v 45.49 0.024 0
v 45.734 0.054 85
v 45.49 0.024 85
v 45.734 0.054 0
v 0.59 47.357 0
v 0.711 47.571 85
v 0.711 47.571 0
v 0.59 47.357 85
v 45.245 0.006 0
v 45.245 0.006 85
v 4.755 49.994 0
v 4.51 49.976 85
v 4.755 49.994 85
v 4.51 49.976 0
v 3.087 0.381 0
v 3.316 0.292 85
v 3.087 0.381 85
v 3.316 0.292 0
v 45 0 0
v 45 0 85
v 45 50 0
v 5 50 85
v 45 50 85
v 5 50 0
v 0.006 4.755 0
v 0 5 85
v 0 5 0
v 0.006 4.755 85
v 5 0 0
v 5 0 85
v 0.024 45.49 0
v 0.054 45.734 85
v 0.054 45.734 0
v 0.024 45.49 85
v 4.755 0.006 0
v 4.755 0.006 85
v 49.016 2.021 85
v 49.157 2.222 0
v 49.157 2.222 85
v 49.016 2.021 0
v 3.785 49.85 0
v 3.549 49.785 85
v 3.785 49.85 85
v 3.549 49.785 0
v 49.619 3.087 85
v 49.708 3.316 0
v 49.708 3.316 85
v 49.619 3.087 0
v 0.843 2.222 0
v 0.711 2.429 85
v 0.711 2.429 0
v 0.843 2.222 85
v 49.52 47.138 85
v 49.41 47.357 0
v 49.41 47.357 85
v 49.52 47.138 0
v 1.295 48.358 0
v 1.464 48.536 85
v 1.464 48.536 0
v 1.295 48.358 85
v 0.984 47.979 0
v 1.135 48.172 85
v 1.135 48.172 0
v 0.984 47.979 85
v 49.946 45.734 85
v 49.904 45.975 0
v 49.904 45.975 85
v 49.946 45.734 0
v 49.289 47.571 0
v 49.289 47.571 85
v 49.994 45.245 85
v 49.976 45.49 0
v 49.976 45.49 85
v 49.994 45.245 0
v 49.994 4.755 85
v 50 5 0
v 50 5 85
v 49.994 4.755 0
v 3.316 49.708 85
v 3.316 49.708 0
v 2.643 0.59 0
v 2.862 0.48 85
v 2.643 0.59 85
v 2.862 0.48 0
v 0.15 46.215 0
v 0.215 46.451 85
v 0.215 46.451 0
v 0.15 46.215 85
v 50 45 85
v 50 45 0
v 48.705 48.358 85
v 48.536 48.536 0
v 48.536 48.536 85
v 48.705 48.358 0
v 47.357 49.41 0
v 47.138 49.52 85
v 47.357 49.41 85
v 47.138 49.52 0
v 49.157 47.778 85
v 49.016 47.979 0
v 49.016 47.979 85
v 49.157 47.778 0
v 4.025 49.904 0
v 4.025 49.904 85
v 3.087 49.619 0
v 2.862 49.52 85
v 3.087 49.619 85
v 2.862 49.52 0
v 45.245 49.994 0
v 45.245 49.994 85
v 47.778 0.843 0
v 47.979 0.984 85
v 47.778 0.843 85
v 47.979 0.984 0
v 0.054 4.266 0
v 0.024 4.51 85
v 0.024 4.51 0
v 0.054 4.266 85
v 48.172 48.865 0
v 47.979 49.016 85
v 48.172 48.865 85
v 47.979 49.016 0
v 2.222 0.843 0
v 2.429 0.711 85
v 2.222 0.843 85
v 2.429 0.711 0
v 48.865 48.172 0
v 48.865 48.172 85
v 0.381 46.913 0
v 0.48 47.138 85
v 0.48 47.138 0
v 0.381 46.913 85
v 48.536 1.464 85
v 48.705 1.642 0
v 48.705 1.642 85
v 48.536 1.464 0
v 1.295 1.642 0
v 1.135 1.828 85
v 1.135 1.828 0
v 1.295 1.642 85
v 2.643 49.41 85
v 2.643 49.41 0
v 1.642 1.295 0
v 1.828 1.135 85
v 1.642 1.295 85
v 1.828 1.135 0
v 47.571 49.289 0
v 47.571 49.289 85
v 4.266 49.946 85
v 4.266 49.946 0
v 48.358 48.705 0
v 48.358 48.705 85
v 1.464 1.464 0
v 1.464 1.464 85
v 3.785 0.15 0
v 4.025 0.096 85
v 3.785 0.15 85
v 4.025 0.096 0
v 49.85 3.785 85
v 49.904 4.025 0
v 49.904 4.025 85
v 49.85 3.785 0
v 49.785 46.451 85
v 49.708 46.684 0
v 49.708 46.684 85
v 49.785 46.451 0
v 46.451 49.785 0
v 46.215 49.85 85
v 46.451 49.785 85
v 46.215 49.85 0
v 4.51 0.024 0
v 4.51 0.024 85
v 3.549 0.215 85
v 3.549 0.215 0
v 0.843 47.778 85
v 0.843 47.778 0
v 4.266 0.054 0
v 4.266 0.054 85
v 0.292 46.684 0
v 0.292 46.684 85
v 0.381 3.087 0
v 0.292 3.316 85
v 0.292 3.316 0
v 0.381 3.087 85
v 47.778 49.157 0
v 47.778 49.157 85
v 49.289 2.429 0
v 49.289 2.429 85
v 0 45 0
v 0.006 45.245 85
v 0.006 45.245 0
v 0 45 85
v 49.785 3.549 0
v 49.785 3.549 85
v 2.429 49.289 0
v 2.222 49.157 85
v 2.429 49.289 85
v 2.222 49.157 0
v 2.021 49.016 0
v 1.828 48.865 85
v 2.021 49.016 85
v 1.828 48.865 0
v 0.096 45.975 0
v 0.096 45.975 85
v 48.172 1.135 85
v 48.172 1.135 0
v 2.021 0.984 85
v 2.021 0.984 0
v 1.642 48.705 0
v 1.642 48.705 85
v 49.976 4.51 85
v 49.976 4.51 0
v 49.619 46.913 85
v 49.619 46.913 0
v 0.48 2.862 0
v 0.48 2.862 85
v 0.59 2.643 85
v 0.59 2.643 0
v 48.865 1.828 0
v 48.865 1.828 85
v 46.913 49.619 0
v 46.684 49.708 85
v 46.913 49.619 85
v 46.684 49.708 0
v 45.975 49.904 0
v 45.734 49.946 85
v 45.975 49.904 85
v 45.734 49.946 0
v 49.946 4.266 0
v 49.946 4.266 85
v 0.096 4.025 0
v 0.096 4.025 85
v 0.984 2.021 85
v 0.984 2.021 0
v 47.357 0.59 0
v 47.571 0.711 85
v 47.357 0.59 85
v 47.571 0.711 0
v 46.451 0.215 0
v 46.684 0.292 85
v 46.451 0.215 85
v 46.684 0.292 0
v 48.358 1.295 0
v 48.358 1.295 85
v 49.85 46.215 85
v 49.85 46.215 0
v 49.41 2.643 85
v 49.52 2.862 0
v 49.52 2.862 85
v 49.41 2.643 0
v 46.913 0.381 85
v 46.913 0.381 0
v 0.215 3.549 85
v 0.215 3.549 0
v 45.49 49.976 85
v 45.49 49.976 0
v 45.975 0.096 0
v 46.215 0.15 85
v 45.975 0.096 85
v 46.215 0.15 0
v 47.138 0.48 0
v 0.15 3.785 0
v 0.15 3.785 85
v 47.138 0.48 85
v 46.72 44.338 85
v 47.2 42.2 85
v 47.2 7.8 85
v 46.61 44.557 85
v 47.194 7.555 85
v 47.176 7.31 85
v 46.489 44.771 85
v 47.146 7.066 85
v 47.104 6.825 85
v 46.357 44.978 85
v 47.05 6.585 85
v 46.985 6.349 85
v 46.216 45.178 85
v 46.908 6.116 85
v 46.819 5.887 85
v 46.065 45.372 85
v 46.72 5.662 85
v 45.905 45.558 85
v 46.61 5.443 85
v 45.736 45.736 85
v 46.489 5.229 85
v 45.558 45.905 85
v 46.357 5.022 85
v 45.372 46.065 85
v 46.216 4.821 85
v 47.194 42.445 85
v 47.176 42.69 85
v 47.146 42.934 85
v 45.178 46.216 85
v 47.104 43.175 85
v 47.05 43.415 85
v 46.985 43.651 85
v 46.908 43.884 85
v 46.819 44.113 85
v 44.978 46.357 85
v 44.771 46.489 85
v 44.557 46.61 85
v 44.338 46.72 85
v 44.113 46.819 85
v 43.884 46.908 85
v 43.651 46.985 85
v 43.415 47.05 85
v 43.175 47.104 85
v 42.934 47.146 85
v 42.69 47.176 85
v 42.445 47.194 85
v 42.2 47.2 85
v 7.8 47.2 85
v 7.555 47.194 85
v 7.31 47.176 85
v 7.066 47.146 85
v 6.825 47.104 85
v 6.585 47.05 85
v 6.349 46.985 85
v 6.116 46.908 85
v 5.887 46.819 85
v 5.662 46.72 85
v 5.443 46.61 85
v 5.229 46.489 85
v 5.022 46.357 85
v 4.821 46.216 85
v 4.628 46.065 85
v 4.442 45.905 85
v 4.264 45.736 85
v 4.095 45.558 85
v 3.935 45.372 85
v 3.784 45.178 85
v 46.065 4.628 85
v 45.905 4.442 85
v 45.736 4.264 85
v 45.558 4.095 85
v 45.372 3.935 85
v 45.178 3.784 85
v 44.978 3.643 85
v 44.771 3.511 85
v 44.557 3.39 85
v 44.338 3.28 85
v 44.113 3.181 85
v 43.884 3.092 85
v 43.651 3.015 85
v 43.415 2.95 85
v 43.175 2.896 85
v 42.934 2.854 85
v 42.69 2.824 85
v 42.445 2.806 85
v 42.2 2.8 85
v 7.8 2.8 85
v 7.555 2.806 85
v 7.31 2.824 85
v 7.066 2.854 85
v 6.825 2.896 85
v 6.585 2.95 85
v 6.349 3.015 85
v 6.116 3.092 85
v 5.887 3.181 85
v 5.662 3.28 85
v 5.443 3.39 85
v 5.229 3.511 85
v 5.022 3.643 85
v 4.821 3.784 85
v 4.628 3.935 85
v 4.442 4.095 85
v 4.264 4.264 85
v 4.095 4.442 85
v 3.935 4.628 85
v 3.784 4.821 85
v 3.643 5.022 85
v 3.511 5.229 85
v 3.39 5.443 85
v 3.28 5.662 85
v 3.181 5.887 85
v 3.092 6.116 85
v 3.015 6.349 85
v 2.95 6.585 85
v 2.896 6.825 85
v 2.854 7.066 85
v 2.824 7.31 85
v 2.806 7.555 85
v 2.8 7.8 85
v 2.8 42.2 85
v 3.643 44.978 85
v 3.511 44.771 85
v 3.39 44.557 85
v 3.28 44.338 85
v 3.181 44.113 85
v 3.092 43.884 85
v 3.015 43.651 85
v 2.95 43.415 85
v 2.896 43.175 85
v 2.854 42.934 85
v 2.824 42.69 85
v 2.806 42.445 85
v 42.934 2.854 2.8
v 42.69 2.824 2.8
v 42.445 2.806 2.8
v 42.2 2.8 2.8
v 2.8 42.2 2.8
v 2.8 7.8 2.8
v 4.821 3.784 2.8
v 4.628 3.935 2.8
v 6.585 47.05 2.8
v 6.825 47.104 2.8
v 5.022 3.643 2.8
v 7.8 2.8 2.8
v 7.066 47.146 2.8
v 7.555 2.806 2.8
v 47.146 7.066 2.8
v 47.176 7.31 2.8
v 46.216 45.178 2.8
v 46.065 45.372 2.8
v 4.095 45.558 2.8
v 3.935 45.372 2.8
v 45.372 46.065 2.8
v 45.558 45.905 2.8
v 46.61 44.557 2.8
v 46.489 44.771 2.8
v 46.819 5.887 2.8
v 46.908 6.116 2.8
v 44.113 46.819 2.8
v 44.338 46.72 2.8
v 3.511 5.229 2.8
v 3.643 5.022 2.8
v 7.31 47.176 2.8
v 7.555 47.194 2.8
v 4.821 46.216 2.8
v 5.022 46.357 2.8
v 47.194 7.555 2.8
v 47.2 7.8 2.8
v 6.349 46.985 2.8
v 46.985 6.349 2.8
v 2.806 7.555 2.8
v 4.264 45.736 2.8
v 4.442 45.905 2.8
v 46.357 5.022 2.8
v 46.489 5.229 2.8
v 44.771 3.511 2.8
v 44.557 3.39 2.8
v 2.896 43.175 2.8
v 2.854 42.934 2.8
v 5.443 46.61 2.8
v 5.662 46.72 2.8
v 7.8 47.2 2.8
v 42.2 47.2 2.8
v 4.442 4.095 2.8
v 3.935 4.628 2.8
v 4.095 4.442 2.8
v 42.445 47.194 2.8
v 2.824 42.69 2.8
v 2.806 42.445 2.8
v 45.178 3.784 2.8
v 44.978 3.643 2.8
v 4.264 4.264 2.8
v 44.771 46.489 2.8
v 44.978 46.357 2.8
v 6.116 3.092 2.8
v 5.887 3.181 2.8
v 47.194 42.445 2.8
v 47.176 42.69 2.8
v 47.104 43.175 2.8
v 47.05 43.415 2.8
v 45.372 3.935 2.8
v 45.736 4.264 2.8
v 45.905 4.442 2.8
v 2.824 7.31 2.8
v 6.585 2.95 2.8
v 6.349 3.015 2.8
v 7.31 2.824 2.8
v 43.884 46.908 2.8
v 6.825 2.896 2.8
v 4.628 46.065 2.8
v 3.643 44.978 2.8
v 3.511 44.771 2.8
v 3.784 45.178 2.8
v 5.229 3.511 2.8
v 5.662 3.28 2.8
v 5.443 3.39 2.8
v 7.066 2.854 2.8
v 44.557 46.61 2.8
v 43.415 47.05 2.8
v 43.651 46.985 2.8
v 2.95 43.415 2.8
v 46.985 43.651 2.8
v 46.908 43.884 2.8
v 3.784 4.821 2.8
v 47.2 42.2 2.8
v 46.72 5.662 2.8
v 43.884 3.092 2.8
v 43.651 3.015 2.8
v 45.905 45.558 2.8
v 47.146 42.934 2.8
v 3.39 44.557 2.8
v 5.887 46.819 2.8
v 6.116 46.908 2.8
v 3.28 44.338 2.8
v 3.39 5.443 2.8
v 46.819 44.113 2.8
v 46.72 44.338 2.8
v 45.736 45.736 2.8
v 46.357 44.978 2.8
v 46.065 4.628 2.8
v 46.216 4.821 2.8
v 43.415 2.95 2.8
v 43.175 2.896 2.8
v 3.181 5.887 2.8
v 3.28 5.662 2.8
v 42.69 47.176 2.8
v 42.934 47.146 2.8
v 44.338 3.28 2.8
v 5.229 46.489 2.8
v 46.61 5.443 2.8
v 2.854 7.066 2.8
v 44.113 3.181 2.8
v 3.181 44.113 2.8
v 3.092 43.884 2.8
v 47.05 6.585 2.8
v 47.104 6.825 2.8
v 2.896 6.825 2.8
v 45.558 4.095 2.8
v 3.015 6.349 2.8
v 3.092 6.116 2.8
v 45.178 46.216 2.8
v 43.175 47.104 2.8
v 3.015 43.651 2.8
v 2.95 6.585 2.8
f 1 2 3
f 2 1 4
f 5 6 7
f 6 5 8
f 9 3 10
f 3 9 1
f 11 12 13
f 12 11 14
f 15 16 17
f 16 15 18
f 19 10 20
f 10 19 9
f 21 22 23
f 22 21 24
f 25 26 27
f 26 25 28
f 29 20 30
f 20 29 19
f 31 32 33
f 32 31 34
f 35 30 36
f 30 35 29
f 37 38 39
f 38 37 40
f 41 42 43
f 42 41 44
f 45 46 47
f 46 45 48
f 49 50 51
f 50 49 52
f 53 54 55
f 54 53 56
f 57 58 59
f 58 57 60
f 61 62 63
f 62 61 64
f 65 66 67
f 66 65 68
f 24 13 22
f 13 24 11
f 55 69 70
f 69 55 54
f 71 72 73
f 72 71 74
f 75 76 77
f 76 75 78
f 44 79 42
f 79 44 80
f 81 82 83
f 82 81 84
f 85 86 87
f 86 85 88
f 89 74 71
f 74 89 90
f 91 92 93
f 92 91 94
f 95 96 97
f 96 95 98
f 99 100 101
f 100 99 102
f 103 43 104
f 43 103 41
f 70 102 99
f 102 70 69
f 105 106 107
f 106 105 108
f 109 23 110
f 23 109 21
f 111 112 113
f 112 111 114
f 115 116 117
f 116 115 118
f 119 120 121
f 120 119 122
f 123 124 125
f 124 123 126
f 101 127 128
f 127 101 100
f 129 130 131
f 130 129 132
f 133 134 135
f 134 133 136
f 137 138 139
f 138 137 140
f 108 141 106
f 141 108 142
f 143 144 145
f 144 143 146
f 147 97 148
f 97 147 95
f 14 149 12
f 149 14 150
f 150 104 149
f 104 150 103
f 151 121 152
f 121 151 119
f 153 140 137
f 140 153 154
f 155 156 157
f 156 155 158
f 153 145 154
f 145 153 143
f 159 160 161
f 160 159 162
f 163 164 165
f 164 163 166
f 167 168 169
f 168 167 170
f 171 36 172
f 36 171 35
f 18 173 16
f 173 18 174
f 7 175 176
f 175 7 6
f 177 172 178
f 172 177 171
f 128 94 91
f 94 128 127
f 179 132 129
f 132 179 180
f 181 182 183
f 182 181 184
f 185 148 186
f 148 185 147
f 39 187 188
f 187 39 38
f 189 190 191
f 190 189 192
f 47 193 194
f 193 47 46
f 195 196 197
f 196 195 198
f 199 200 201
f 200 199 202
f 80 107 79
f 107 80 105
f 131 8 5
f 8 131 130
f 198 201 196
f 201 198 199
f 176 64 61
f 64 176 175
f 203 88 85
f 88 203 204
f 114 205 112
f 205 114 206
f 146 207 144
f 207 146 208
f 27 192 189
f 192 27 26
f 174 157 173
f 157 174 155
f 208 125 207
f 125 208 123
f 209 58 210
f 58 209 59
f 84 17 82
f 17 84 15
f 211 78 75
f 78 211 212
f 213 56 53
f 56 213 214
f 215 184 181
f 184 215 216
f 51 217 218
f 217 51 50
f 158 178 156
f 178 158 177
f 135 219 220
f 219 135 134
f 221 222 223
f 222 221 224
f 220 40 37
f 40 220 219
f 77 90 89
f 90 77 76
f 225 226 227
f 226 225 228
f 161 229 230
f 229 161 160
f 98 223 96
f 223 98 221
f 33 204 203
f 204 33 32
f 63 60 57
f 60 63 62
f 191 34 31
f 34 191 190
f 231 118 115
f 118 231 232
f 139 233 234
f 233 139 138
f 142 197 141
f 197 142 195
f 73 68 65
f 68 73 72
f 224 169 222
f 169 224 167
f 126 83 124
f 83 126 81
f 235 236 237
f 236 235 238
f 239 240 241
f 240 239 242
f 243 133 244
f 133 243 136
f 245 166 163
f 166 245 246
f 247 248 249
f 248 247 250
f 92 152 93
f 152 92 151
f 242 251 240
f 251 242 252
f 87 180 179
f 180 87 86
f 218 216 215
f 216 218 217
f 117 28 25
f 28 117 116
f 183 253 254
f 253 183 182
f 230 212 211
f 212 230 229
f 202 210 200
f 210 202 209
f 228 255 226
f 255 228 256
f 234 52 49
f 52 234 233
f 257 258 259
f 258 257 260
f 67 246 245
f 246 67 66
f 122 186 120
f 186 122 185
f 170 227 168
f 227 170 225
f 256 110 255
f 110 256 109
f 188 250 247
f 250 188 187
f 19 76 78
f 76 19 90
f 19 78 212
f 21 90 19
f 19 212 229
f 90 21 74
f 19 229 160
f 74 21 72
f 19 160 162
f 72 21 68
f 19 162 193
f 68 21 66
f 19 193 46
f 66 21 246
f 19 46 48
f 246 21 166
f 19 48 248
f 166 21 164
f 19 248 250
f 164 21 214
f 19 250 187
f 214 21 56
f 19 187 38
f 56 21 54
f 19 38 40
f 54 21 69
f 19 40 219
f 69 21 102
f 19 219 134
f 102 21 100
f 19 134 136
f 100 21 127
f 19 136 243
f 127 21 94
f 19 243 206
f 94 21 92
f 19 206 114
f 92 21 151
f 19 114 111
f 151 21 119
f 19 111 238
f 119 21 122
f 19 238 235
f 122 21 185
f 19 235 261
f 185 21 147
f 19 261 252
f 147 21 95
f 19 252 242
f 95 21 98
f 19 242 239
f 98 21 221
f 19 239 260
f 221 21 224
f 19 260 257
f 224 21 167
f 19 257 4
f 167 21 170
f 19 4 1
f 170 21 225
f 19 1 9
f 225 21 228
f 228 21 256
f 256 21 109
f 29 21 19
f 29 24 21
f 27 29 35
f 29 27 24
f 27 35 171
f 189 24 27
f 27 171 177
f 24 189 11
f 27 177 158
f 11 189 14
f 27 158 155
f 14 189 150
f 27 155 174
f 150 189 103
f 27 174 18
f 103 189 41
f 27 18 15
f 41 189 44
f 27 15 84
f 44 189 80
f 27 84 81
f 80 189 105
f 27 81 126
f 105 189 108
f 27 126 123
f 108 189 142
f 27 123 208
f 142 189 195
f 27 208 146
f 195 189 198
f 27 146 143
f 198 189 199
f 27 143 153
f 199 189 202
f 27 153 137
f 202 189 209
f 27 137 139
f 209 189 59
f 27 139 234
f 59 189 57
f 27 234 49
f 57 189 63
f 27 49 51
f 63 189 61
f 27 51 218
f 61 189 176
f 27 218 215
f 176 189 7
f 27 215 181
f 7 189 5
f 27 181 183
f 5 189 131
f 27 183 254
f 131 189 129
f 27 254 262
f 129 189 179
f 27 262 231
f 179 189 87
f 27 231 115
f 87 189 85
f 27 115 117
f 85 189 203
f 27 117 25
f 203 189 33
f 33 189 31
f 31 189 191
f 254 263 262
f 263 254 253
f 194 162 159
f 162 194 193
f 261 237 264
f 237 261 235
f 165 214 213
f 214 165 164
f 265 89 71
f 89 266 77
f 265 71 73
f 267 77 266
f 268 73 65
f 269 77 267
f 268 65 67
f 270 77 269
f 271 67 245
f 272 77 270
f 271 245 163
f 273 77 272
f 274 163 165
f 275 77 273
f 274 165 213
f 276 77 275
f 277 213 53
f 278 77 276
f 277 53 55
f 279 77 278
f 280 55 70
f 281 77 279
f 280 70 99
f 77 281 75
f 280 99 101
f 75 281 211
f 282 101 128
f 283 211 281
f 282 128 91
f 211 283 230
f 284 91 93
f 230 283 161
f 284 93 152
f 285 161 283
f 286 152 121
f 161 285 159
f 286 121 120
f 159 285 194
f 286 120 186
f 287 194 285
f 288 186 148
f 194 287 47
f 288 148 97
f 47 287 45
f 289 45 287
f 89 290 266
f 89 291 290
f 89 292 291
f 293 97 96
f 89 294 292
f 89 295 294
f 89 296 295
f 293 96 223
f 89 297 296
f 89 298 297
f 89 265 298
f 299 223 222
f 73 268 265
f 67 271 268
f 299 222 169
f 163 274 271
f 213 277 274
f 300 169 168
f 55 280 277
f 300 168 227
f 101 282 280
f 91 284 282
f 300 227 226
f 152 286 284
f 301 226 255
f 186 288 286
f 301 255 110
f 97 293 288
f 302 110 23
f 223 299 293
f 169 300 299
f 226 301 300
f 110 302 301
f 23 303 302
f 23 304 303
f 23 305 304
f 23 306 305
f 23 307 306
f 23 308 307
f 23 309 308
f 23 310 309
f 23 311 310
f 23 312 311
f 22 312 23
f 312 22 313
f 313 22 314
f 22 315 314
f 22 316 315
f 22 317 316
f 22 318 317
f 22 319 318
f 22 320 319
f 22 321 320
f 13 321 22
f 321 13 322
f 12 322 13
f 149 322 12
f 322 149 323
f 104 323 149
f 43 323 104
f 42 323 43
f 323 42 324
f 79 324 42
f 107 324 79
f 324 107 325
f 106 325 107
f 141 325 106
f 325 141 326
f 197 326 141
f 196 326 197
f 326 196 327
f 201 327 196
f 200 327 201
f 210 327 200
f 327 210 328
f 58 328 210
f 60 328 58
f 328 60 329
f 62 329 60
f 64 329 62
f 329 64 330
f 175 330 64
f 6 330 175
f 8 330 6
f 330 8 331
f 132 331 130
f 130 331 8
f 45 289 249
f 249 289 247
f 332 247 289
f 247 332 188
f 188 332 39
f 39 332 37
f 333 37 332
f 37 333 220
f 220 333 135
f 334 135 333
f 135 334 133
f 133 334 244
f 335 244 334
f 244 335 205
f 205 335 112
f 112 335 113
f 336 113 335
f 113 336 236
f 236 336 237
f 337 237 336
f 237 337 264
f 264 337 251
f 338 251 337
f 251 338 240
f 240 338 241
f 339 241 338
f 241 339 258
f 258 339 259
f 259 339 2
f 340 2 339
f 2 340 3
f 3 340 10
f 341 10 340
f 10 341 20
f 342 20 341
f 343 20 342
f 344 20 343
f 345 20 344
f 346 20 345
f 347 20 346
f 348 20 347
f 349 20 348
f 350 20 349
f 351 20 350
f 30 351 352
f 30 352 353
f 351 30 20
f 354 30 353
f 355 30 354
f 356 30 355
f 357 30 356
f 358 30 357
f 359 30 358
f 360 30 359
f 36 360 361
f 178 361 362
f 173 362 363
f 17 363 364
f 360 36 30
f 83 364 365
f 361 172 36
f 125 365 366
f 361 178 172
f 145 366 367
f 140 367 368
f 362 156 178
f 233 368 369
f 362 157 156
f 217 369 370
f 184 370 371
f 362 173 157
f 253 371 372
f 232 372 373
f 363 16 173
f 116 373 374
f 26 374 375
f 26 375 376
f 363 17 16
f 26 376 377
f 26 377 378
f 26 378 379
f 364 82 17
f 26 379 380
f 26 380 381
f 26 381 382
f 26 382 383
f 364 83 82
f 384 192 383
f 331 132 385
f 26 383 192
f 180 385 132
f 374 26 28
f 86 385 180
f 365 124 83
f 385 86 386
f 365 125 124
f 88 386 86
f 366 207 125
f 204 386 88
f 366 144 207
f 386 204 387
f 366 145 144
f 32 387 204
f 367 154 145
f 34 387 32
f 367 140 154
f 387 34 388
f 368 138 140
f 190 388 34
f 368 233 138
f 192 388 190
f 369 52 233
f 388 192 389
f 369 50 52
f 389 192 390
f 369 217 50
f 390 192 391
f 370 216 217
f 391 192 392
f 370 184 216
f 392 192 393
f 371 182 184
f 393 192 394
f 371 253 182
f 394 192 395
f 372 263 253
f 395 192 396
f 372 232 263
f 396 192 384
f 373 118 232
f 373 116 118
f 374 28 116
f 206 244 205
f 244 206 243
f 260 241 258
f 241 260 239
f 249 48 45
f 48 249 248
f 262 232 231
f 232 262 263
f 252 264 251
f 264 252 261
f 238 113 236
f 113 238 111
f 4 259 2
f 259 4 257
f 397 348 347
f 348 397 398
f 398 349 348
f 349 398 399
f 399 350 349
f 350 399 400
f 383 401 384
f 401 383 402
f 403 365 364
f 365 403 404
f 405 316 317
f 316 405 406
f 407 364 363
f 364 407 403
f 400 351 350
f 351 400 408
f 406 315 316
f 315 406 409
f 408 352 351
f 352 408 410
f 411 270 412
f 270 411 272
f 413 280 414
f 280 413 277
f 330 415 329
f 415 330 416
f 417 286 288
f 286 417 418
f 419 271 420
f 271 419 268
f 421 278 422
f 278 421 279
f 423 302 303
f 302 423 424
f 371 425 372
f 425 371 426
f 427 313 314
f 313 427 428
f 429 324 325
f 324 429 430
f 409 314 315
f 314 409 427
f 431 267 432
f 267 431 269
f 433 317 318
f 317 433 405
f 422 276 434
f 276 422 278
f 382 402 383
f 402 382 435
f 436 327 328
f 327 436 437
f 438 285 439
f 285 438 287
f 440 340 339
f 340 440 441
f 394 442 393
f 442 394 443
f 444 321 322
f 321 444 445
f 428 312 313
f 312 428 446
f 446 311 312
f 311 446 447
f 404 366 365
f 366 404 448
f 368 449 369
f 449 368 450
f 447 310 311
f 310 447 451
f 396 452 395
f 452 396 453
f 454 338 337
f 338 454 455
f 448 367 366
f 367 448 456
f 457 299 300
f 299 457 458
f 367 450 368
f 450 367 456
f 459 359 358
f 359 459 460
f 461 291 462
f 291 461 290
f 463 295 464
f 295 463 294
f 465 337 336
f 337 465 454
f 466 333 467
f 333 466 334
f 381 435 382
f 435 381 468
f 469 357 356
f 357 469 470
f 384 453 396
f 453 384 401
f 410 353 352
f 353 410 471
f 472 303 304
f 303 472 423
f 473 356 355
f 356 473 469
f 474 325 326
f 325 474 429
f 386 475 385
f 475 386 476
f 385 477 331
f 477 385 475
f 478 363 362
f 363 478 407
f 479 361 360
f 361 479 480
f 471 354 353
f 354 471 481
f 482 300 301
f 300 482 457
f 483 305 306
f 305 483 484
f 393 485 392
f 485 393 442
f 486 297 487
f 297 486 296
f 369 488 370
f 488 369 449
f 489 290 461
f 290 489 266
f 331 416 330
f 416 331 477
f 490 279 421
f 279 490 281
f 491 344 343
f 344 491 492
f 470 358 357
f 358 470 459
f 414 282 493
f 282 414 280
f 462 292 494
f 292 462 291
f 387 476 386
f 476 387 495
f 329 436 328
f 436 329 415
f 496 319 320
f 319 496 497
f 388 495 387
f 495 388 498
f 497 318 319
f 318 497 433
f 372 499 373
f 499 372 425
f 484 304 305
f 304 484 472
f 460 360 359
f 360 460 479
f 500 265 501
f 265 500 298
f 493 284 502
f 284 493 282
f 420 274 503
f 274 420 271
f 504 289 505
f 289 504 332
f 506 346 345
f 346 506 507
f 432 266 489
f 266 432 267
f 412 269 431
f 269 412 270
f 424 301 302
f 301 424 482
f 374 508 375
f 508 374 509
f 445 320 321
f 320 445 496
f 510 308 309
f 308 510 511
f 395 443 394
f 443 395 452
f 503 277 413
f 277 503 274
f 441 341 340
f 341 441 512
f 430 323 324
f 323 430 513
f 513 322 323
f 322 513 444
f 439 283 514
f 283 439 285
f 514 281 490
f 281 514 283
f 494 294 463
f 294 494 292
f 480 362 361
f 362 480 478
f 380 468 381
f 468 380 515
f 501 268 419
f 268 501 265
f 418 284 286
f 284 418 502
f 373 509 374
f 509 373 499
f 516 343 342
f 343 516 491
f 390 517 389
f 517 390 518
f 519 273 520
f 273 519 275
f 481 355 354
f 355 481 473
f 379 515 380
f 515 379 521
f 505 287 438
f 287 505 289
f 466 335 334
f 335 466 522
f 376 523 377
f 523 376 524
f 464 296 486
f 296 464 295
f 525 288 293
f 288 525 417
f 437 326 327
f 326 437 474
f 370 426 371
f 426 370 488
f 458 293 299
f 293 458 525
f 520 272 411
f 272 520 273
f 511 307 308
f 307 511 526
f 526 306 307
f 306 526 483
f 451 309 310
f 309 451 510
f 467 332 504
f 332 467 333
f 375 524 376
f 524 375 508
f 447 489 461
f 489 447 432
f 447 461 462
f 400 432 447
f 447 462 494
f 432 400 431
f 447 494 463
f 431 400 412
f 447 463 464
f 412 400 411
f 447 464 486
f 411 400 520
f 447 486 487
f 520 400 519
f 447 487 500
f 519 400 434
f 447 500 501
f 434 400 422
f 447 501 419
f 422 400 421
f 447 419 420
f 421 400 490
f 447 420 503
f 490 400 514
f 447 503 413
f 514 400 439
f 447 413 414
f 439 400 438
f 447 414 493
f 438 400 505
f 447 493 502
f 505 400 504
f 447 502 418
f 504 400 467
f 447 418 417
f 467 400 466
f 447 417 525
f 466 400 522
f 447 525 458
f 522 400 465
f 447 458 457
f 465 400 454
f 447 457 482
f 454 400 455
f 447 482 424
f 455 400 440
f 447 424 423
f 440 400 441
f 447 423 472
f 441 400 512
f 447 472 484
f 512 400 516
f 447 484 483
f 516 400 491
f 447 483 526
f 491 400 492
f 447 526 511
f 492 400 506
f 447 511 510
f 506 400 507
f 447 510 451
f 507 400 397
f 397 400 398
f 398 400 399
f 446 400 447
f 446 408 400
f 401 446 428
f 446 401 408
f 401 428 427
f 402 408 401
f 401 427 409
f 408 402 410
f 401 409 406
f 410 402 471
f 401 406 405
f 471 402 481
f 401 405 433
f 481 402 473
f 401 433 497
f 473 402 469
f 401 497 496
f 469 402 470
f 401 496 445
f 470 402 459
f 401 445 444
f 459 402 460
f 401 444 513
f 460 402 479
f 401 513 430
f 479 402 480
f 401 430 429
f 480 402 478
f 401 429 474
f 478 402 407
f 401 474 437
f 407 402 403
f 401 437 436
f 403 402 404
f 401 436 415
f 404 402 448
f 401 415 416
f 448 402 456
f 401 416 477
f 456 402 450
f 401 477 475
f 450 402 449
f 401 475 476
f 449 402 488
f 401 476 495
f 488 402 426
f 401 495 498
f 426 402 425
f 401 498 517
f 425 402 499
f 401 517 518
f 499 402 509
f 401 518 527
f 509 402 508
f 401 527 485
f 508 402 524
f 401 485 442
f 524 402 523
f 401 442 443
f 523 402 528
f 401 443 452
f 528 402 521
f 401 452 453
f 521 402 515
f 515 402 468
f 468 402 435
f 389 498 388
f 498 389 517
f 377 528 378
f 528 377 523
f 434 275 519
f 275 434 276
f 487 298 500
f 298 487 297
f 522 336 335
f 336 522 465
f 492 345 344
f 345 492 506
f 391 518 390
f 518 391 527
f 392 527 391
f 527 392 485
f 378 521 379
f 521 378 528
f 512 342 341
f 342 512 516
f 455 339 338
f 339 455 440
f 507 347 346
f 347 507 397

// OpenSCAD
$fn = 128;

t = 2.8;
size = 50;
h = 85;

module fillet(smooth) {
   offset(r = smooth) {
     offset(delta = -smooth) {
       children();
     }
   }
}

difference() {
    linear_extrude(h) fillet(5) square(size);
    translate([t, t, t]) linear_extrude(h-t) fillet(5) square(size-2*t);
}
